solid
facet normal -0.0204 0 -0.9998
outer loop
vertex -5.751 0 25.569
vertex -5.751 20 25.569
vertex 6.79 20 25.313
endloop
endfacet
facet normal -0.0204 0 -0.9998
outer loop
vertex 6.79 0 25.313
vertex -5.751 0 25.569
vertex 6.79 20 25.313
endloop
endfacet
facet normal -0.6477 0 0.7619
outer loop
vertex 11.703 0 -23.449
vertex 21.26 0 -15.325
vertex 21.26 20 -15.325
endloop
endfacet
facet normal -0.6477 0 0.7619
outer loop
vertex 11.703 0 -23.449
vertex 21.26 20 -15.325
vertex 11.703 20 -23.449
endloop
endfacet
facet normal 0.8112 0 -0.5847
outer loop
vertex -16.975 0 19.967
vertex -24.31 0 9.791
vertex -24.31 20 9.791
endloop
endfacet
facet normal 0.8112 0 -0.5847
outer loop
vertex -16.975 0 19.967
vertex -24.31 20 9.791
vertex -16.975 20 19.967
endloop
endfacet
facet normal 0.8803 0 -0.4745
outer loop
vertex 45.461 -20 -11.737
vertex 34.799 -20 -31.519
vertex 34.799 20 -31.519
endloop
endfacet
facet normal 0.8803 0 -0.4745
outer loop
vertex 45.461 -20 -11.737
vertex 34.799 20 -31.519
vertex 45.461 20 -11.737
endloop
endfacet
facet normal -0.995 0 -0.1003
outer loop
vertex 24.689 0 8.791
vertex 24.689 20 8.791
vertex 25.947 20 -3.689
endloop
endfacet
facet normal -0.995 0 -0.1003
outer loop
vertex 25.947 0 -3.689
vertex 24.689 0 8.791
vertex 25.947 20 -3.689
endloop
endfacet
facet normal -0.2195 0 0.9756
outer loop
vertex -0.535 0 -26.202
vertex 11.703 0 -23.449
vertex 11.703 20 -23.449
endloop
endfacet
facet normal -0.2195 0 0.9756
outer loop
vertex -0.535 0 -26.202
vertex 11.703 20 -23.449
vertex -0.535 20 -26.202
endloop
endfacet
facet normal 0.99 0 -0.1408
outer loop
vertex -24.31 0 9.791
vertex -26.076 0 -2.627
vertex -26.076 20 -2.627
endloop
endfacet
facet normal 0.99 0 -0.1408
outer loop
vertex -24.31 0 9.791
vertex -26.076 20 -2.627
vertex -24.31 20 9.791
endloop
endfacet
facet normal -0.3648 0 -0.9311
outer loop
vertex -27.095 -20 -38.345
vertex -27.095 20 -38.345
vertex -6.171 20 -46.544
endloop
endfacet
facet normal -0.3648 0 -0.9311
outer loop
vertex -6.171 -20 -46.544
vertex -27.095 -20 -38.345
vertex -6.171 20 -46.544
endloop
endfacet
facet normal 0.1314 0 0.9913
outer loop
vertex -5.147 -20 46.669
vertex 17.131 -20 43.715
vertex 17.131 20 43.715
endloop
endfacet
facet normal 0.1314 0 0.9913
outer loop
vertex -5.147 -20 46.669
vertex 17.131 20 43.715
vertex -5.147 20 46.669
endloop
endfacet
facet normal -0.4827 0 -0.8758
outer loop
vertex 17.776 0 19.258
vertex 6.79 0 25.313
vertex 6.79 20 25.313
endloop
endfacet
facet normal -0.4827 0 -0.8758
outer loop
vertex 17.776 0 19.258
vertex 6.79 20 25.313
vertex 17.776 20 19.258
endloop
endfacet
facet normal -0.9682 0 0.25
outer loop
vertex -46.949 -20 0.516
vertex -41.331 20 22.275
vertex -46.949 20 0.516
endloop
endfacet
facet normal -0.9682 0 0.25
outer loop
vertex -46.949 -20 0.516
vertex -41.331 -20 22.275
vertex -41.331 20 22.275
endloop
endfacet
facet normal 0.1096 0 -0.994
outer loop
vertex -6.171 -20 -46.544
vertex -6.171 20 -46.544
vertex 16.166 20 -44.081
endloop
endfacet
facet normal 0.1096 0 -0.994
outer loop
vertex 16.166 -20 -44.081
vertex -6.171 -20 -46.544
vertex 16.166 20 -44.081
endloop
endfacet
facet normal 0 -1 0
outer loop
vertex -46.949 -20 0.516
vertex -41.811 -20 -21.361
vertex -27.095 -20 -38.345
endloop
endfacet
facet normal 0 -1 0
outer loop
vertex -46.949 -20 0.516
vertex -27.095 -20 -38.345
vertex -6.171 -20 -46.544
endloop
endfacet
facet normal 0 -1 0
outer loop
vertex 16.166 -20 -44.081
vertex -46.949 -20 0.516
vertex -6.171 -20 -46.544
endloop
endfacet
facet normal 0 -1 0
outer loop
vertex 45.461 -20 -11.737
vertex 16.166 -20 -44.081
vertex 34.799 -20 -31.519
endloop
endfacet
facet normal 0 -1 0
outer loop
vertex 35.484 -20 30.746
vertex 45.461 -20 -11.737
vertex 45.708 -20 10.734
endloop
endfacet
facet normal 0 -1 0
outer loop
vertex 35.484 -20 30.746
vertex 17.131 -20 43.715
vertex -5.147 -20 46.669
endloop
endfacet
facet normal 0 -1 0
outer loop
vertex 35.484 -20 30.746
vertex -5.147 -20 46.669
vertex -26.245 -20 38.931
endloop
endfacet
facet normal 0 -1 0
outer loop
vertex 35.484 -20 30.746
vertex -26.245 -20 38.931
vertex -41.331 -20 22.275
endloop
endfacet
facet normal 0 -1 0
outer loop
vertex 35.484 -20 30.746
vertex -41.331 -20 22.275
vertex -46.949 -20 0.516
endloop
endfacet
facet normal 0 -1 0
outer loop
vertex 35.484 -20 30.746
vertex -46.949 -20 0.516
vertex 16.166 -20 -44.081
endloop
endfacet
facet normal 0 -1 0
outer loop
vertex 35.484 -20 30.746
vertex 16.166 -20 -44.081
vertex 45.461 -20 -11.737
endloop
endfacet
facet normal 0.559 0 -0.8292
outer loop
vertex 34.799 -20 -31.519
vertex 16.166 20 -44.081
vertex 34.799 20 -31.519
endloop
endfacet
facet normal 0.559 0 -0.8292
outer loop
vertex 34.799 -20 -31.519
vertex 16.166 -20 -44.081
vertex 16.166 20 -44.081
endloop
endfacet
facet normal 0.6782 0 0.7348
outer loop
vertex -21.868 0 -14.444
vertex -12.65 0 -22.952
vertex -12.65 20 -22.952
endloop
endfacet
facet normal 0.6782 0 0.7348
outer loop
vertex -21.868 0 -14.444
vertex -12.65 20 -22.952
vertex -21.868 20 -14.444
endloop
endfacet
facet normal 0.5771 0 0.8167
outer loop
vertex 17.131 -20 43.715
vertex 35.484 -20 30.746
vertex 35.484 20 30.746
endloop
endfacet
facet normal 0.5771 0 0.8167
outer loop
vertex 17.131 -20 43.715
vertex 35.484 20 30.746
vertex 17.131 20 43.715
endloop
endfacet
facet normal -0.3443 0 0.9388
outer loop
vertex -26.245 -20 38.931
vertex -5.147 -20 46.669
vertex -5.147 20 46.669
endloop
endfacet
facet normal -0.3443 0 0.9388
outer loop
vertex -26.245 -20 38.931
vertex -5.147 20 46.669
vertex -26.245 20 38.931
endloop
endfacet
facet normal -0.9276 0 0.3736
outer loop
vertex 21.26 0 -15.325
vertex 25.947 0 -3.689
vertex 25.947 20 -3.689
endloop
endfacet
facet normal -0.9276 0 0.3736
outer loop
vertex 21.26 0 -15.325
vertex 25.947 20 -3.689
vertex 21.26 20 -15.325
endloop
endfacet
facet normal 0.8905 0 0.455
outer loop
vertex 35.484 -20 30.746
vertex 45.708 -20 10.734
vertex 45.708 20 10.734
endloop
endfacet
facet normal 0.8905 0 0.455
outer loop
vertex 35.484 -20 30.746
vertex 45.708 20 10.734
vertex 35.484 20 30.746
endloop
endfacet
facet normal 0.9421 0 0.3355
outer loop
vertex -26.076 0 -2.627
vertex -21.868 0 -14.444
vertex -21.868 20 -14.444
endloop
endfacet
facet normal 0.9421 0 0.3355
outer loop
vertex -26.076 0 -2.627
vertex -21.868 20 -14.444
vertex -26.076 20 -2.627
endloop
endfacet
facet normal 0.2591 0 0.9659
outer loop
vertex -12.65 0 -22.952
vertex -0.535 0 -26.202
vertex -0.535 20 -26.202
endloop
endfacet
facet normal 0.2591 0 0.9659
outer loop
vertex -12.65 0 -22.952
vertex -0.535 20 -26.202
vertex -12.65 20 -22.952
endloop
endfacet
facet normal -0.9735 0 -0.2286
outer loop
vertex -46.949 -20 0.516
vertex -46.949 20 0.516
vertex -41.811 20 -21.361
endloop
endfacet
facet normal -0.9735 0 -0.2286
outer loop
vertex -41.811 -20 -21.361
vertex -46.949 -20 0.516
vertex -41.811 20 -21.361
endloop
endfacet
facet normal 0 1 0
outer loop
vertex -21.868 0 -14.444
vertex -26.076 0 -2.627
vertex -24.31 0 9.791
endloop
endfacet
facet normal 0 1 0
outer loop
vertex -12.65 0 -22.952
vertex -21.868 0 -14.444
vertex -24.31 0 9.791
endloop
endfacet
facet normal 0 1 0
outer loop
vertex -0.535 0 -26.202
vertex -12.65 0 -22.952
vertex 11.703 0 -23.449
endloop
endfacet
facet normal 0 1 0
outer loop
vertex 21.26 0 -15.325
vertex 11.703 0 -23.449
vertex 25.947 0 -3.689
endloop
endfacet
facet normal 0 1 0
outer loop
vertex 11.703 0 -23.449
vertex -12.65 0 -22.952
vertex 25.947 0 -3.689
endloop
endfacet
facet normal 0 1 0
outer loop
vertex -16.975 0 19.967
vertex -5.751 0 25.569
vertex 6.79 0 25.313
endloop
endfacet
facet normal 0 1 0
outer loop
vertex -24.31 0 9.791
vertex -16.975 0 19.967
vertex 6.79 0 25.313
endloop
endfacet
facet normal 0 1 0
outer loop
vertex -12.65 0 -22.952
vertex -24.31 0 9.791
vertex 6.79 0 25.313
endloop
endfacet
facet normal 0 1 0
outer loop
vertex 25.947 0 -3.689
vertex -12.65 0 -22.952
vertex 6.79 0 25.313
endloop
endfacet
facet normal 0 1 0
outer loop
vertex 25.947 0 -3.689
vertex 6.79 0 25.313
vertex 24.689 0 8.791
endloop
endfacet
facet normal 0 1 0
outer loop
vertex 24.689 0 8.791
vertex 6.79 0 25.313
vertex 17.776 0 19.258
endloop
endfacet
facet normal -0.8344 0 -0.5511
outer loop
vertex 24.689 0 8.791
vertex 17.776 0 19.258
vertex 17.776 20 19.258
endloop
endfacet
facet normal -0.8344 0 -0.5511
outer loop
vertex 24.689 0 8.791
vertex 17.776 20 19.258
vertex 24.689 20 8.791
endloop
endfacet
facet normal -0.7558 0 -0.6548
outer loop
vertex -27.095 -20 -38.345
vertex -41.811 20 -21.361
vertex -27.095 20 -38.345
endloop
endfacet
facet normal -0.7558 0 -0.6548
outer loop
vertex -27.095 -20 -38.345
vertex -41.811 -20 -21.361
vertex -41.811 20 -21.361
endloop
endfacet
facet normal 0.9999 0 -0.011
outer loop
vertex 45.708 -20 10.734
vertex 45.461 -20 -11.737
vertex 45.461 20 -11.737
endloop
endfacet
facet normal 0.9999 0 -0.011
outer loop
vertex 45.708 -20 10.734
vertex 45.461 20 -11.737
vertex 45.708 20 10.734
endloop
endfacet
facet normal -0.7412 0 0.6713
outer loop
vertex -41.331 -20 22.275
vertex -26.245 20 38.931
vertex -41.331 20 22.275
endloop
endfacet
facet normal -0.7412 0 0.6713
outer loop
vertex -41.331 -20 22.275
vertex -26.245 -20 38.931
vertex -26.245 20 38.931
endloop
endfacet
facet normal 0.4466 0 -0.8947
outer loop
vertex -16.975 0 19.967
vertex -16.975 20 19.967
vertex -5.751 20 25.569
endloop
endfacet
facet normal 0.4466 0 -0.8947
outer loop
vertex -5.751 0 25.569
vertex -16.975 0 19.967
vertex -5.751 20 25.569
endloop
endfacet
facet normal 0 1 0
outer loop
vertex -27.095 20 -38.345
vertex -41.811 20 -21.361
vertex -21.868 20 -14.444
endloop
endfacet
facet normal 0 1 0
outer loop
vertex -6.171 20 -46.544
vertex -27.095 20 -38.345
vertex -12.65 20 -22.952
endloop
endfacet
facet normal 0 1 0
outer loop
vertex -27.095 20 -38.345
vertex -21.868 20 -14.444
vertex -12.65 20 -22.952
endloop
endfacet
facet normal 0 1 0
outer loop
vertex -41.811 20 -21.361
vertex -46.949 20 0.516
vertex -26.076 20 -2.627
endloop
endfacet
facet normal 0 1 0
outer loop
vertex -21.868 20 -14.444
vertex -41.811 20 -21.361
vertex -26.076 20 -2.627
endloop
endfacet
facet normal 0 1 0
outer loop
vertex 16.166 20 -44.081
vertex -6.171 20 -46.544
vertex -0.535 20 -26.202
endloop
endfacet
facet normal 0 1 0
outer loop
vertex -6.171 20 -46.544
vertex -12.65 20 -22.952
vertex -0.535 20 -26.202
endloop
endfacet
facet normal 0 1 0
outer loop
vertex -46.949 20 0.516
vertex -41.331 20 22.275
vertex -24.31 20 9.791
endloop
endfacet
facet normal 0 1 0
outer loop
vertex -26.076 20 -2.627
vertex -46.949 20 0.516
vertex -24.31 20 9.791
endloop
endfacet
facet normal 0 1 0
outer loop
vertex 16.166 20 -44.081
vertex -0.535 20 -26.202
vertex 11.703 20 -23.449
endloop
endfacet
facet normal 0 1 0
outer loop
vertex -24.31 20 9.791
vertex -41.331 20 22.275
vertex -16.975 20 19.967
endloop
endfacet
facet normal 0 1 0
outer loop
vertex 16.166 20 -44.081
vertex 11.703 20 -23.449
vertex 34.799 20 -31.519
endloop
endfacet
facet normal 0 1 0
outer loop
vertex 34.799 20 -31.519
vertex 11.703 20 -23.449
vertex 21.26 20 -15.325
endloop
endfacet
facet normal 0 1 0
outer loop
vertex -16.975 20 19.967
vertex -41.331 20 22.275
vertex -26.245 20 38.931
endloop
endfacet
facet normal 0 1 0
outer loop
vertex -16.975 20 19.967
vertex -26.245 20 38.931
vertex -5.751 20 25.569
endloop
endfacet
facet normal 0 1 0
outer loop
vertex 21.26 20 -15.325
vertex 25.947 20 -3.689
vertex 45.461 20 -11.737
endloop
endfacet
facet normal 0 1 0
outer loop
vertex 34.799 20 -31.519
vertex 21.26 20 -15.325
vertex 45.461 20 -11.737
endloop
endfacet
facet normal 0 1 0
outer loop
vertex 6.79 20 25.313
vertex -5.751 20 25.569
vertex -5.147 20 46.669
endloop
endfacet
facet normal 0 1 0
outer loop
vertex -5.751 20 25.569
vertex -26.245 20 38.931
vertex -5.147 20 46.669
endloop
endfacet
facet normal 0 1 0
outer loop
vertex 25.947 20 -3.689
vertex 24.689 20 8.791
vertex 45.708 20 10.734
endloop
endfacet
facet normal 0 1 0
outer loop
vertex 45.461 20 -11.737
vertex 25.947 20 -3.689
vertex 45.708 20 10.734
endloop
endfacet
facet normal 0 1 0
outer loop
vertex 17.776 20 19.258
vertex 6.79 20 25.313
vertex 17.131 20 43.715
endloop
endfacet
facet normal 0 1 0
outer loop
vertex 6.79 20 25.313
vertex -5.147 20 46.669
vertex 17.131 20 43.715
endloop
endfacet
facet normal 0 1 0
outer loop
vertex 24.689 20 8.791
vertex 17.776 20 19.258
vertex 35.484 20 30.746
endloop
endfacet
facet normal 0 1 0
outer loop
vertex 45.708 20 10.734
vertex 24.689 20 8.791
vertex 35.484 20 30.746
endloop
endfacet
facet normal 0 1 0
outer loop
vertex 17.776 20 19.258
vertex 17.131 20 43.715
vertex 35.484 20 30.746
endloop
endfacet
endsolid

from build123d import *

# Parameters (mm, degrees)
F1_DEPTH = 20
F2_DEPTH = 20


with BuildPart() as f1:
    # F0 (on Front) → F1 (new body, symmetric)
    with BuildSketch(Plane.XZ):
        Polygon((16.16565, -44.080839), (34.79936, -31.519093), (45.460955, -11.736702), (45.707994, 10.734426), (35.483882, 30.746426), (17.130841, 43.714791), (-5.14667, 46.668624), (-26.245141, 38.931237), (-41.331166, 22.275173), (-46.948719, 0.516136), (-41.810887, -21.361142), (-27.094684, -38.34484), (-6.171415, -46.544197), align=None)
        Polygon((21.260118, -15.324641), (11.703184, -23.449365), (-0.534809, -26.202123), (-12.650283, -22.952289), (-21.86773, -14.444363), (-26.075544, -2.627408), (-24.309764, 9.791456), (-16.974911, 19.967214), (-5.75131, 25.568725), (6.789846, 25.312748), (17.775531, 19.257927), (24.689056, 8.791346), (25.946615, -3.689226), align=None, mode=Mode.SUBTRACT)
    extrude(amount=F1_DEPTH, both=True)

    # F0 (on Front) → F2 (join)
    with BuildSketch(Plane.XZ):
        Polygon((-0.534809, -26.202123), (11.703184, -23.449365), (21.260118, -15.324641), (25.946615, -3.689226), (24.689056, 8.791346), (17.775531, 19.257927), (6.789846, 25.312748), (-5.75131, 25.568725), (-16.974911, 19.967214), (-24.309764, 9.791456), (-26.075544, -2.627408), (-21.86773, -14.444363), (-12.650283, -22.952289), align=None)
    extrude(amount=F2_DEPTH)


solid = f1.part
